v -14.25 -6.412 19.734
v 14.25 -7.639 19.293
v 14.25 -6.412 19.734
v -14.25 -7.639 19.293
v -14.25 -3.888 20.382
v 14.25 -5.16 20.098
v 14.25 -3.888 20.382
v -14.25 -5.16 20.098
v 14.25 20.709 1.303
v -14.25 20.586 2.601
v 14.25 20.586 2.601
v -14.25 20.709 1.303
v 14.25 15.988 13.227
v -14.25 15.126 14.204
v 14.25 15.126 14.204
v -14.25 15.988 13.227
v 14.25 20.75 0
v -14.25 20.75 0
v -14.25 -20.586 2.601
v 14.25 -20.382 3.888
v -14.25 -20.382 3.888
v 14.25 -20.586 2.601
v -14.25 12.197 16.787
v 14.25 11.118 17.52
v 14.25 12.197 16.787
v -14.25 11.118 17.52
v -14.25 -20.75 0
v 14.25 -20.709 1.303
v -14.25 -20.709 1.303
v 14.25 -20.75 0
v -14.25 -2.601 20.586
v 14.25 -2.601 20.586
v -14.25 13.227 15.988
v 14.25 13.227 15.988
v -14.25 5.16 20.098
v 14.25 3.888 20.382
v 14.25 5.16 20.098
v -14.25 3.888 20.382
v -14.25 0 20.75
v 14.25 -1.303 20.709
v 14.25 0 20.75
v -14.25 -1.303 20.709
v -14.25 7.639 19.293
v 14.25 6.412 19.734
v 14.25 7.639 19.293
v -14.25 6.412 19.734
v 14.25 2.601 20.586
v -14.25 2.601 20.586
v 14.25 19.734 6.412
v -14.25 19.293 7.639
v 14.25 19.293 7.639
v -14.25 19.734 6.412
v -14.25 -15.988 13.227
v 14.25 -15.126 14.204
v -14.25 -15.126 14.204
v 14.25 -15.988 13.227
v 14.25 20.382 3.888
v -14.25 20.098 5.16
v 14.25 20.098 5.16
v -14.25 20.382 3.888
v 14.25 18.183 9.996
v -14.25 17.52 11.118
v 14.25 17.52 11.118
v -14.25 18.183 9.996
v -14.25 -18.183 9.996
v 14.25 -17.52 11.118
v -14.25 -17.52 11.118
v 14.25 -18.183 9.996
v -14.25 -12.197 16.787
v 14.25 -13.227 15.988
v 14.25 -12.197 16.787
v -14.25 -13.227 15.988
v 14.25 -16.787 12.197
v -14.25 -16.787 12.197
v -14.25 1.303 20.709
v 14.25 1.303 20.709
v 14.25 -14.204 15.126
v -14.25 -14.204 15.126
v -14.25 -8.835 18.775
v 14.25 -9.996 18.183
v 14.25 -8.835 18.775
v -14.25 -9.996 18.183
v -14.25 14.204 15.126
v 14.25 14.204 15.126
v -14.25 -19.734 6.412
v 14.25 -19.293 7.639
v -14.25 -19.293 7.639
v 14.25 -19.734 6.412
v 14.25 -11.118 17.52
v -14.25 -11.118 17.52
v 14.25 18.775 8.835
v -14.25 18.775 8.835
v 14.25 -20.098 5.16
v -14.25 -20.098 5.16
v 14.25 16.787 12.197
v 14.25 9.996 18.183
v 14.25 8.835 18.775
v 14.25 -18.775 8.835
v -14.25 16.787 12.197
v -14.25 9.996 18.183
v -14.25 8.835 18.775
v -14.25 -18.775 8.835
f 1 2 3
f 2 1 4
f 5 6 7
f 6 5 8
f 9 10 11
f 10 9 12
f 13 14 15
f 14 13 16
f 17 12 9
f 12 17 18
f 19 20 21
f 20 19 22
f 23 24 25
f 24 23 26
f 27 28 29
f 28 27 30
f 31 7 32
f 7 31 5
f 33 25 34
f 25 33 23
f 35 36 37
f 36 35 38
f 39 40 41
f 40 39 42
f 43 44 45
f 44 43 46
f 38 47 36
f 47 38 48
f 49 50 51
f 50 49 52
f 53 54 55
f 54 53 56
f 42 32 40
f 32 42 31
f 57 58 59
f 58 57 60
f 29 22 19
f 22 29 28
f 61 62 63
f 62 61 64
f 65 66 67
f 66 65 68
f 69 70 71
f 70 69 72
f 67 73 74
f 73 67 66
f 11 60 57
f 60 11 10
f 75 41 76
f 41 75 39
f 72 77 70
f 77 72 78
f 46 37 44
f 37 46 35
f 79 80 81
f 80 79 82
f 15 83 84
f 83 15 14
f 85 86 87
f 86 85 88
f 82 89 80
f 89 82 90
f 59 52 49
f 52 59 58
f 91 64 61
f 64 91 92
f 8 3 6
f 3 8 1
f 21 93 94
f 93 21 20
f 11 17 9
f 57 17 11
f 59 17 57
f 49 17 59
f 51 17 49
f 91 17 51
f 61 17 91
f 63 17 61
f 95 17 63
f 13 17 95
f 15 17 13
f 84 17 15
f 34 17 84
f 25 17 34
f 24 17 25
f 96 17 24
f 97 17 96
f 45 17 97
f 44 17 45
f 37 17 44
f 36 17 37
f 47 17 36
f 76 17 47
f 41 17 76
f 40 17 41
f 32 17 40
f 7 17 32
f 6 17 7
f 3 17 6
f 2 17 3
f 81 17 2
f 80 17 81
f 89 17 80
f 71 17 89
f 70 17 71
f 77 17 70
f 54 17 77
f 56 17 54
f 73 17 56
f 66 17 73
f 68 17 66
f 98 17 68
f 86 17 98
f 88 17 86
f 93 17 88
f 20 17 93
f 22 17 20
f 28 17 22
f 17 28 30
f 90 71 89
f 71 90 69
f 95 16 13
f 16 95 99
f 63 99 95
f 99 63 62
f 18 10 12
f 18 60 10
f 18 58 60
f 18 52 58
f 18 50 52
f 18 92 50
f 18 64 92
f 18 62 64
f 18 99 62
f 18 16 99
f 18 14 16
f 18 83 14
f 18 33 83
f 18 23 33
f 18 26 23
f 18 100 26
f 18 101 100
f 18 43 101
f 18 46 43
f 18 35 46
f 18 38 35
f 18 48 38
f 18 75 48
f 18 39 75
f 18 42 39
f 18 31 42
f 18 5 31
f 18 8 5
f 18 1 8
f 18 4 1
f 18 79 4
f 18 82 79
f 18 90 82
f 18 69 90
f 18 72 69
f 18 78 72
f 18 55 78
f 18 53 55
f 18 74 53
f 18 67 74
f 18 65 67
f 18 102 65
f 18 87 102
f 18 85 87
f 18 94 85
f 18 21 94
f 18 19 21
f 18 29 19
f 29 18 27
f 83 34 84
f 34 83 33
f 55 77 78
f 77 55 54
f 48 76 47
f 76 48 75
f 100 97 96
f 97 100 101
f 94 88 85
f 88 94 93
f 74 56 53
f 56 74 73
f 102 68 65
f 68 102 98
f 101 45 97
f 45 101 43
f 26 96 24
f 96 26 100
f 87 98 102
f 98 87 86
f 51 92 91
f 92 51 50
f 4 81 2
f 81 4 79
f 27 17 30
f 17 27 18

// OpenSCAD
//$fs = 0.1; [size in mm] | $fa = 1; [degrees]
//$fn = 100; [defined faces]
// ,$fs=0.1,$fn=100

diaWheel = 37.5;
diaAxis = 11;
wdhWheel = 7.5;
wdhAxis = wdhWheel*2+13.5;

module pairOfWheel(dWheel,dAxis,wWheel,wAxis,fs=0.1,fn=100) {
	translate([-wAxis/2,0,0]) rotate([0,90,0]) union() {
		cylinder(wWheel,d=dWheel,$fs=fs,$fn=fn);
		cylinder(wAxis,d=diaAxis,$fs=fs,$fn=fn);
		translate([0,0,wAxis-wWheel]) cylinder(wWheel,d=dWheel,$fs=fs,$fn=fn);
	}
}

module mudguard(wAxis,dWheel,fs=0.1,fn=100) {
	dWeelOffset = dWheel+4;
	difference() {
		translate([-wdhAxis/2,0,0]) rotate([0,90,0]) cylinder(wdhAxis,d=dWeelOffset,true,$fs=fs,$fn=fn);
		translate([0,0,-dWeelOffset/2]) cube([dWeelOffset,dWeelOffset,dWeelOffset],true,$fs=fs,$fn=fn);
		
	}
}

mudguard(wdhAxis,diaWheel);
//pairOfWheel(diaWheel,diaAxis,wdhWheel,wdhAxis);
